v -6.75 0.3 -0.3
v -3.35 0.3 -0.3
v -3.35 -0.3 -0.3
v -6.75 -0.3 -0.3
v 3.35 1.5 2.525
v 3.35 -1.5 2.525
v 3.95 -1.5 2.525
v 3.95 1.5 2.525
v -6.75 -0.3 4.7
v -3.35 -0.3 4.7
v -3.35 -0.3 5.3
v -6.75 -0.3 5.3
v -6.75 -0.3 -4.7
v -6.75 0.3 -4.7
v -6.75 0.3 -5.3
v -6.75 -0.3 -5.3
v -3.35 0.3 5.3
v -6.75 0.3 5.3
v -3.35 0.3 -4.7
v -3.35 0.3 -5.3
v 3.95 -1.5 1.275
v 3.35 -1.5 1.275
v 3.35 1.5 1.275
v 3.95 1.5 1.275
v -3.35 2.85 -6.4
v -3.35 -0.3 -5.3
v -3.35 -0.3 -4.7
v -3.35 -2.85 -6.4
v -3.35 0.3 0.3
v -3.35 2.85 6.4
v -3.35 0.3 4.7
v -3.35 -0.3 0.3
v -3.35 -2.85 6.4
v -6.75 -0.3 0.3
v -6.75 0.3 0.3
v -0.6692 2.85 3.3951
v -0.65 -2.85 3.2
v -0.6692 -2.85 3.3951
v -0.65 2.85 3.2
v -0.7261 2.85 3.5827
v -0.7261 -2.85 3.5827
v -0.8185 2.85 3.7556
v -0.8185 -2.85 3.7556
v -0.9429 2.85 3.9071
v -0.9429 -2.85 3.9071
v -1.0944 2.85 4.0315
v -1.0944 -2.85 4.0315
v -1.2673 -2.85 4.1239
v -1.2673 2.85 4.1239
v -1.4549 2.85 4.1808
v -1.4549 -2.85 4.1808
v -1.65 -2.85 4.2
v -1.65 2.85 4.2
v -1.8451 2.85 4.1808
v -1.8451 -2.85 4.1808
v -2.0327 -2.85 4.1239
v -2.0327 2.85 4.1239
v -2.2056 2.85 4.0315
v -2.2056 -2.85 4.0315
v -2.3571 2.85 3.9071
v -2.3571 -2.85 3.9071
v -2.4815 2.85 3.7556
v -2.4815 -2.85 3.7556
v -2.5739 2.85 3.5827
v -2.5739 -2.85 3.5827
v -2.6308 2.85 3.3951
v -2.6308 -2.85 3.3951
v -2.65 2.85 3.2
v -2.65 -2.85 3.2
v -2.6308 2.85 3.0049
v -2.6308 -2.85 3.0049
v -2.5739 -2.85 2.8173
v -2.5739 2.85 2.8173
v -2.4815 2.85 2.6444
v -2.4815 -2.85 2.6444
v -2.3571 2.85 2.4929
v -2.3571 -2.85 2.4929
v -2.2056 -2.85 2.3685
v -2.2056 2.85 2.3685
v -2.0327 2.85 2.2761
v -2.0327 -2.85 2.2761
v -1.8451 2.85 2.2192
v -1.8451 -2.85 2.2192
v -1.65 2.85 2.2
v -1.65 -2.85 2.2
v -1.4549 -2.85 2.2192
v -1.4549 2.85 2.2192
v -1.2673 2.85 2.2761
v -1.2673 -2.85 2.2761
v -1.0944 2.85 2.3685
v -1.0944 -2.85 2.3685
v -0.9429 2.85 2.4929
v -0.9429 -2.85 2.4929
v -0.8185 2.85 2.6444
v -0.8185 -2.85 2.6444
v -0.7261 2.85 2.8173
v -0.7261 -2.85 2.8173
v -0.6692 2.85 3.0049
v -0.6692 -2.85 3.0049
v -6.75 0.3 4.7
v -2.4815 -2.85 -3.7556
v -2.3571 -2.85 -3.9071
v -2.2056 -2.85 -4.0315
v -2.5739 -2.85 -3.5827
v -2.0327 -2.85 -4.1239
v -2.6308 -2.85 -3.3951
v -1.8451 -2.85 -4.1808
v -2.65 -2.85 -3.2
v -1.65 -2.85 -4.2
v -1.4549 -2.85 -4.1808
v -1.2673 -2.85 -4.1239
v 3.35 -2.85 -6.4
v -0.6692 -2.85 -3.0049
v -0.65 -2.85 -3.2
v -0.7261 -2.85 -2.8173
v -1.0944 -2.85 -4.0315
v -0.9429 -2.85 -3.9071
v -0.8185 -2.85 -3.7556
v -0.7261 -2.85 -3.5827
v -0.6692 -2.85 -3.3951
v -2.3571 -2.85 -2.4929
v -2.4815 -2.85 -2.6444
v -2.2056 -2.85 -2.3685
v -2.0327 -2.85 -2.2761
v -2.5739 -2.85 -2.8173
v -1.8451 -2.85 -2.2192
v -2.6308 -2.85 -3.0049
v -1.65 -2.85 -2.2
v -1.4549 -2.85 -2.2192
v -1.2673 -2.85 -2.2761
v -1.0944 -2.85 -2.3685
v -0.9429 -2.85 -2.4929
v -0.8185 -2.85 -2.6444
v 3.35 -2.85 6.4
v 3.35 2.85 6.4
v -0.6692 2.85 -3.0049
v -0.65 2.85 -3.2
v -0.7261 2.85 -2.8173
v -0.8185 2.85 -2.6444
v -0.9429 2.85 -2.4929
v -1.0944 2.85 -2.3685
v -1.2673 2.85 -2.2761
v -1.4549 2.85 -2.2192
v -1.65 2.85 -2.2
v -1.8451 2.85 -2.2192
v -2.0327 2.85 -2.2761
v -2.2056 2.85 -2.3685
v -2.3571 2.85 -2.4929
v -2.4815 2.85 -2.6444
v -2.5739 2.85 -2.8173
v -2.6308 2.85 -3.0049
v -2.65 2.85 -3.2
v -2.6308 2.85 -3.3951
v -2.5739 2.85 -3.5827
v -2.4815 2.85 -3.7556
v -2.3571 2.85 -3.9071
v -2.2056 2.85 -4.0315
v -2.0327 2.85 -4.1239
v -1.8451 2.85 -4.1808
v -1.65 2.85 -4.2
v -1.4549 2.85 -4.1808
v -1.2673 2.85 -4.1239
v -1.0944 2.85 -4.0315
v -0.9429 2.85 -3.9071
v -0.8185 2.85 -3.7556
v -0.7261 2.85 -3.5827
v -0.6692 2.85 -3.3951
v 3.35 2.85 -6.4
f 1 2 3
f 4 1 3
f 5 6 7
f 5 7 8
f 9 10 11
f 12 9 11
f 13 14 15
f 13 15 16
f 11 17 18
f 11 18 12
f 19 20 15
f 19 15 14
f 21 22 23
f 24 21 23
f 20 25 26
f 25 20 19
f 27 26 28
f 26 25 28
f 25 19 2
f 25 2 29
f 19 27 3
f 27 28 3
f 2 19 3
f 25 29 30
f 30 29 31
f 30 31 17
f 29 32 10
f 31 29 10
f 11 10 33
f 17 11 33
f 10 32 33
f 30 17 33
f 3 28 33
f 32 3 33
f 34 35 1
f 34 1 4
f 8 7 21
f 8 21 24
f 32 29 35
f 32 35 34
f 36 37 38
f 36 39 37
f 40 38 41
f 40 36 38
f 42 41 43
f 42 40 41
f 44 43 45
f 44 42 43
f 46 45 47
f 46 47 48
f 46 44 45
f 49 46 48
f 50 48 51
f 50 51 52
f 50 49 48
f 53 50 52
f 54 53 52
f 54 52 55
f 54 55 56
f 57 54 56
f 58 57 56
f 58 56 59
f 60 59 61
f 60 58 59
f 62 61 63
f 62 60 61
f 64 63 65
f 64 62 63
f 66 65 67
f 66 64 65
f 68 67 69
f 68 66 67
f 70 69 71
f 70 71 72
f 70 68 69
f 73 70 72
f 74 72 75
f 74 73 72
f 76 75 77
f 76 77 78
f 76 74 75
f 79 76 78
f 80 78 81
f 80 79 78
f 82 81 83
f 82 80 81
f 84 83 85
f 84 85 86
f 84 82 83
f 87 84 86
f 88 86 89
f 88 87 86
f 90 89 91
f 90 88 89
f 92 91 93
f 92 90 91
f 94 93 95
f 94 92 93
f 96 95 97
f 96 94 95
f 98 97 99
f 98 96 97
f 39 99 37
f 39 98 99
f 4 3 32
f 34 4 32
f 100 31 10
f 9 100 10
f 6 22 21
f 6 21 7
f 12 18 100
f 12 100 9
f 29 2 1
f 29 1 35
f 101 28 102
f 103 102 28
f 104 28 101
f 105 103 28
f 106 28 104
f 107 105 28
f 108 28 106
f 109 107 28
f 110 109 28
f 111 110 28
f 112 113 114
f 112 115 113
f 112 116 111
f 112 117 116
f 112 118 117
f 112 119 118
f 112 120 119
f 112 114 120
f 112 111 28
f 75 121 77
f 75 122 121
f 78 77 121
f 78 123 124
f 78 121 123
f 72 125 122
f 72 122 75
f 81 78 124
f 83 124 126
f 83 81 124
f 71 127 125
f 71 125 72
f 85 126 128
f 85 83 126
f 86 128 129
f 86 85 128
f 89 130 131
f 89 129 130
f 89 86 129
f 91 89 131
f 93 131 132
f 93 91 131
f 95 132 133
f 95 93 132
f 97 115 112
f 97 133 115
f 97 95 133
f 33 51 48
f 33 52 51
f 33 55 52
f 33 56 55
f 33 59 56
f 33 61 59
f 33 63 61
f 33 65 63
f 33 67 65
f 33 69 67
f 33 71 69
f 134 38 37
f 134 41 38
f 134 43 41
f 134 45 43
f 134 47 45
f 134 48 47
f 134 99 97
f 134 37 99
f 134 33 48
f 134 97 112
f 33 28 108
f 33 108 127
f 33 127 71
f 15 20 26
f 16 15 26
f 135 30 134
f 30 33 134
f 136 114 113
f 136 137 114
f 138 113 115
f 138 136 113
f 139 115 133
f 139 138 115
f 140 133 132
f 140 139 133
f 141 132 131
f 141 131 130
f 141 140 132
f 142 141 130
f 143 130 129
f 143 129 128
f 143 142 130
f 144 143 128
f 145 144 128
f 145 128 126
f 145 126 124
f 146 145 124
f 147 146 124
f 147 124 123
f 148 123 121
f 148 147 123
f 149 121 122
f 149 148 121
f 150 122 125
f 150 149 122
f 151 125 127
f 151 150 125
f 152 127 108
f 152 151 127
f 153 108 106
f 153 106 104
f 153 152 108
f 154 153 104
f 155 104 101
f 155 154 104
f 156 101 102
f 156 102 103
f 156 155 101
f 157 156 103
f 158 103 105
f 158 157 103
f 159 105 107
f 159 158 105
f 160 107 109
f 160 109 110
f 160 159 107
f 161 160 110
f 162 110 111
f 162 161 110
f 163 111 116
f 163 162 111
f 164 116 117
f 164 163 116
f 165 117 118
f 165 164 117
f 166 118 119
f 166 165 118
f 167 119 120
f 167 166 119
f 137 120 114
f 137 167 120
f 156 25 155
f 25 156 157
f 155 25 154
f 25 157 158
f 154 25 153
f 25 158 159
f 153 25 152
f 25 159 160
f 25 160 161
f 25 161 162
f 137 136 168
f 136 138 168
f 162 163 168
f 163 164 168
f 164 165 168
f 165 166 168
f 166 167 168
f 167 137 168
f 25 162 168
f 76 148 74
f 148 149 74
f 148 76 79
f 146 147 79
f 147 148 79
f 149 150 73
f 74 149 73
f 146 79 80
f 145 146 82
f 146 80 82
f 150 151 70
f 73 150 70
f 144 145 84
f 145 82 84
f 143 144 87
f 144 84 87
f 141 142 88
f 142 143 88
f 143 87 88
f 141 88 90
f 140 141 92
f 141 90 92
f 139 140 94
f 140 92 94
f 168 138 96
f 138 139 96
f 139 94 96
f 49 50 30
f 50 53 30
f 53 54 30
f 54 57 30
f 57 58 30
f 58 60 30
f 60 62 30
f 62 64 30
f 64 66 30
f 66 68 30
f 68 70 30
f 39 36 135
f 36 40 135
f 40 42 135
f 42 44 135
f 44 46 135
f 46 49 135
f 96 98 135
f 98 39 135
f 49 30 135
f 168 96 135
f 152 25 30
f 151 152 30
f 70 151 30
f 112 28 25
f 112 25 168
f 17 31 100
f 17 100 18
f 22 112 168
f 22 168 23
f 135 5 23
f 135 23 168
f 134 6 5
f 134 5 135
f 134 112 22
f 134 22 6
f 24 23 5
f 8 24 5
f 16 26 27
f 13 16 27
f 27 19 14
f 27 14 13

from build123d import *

# Parameters (mm, degrees)
F0_W     = 6.7
F0_H     = 12.8
F0_R     = 1
F1_DEPTH = 2.85
F2_W     = 0.6
F2_H     = 0.6
F3_DEPTH = 3.4
F4_W     = 3
F4_H     = 1.25
F5_DEPTH = 0.6


with BuildPart() as f1:
    # F0 (on Front) → F1 (new body, symmetric)
    with BuildSketch(Plane.XZ):
        Rectangle(F0_W, F0_H)
        with Locations((-1.65, -3.2)):
            Circle(F0_R, mode=Mode.SUBTRACT)
        with Locations((-1.65, 3.2)):
            Circle(F0_R, mode=Mode.SUBTRACT)
    extrude(amount=F1_DEPTH, both=True)

    # F2 (on face) → F3 (join)
    with BuildSketch(Plane(origin=(-3.35, 0, 0), x_dir=(0, -1, 0), z_dir=(-1, 0, 0))):
        Rectangle(F2_W, F2_H)
        with Locations((0, 5)):
            Rectangle(F2_W, F2_H)
        with Locations((0, -5)):
            Rectangle(F2_W, F2_H)
    extrude(amount=F3_DEPTH)

    # F4 (on face) → F5 (join)
    with BuildSketch(Plane.YZ.offset(3.35)):
        with Locations((0, 1.9)):
            Rectangle(F4_W, F4_H)
    extrude(amount=F5_DEPTH)


solid = f1.part
